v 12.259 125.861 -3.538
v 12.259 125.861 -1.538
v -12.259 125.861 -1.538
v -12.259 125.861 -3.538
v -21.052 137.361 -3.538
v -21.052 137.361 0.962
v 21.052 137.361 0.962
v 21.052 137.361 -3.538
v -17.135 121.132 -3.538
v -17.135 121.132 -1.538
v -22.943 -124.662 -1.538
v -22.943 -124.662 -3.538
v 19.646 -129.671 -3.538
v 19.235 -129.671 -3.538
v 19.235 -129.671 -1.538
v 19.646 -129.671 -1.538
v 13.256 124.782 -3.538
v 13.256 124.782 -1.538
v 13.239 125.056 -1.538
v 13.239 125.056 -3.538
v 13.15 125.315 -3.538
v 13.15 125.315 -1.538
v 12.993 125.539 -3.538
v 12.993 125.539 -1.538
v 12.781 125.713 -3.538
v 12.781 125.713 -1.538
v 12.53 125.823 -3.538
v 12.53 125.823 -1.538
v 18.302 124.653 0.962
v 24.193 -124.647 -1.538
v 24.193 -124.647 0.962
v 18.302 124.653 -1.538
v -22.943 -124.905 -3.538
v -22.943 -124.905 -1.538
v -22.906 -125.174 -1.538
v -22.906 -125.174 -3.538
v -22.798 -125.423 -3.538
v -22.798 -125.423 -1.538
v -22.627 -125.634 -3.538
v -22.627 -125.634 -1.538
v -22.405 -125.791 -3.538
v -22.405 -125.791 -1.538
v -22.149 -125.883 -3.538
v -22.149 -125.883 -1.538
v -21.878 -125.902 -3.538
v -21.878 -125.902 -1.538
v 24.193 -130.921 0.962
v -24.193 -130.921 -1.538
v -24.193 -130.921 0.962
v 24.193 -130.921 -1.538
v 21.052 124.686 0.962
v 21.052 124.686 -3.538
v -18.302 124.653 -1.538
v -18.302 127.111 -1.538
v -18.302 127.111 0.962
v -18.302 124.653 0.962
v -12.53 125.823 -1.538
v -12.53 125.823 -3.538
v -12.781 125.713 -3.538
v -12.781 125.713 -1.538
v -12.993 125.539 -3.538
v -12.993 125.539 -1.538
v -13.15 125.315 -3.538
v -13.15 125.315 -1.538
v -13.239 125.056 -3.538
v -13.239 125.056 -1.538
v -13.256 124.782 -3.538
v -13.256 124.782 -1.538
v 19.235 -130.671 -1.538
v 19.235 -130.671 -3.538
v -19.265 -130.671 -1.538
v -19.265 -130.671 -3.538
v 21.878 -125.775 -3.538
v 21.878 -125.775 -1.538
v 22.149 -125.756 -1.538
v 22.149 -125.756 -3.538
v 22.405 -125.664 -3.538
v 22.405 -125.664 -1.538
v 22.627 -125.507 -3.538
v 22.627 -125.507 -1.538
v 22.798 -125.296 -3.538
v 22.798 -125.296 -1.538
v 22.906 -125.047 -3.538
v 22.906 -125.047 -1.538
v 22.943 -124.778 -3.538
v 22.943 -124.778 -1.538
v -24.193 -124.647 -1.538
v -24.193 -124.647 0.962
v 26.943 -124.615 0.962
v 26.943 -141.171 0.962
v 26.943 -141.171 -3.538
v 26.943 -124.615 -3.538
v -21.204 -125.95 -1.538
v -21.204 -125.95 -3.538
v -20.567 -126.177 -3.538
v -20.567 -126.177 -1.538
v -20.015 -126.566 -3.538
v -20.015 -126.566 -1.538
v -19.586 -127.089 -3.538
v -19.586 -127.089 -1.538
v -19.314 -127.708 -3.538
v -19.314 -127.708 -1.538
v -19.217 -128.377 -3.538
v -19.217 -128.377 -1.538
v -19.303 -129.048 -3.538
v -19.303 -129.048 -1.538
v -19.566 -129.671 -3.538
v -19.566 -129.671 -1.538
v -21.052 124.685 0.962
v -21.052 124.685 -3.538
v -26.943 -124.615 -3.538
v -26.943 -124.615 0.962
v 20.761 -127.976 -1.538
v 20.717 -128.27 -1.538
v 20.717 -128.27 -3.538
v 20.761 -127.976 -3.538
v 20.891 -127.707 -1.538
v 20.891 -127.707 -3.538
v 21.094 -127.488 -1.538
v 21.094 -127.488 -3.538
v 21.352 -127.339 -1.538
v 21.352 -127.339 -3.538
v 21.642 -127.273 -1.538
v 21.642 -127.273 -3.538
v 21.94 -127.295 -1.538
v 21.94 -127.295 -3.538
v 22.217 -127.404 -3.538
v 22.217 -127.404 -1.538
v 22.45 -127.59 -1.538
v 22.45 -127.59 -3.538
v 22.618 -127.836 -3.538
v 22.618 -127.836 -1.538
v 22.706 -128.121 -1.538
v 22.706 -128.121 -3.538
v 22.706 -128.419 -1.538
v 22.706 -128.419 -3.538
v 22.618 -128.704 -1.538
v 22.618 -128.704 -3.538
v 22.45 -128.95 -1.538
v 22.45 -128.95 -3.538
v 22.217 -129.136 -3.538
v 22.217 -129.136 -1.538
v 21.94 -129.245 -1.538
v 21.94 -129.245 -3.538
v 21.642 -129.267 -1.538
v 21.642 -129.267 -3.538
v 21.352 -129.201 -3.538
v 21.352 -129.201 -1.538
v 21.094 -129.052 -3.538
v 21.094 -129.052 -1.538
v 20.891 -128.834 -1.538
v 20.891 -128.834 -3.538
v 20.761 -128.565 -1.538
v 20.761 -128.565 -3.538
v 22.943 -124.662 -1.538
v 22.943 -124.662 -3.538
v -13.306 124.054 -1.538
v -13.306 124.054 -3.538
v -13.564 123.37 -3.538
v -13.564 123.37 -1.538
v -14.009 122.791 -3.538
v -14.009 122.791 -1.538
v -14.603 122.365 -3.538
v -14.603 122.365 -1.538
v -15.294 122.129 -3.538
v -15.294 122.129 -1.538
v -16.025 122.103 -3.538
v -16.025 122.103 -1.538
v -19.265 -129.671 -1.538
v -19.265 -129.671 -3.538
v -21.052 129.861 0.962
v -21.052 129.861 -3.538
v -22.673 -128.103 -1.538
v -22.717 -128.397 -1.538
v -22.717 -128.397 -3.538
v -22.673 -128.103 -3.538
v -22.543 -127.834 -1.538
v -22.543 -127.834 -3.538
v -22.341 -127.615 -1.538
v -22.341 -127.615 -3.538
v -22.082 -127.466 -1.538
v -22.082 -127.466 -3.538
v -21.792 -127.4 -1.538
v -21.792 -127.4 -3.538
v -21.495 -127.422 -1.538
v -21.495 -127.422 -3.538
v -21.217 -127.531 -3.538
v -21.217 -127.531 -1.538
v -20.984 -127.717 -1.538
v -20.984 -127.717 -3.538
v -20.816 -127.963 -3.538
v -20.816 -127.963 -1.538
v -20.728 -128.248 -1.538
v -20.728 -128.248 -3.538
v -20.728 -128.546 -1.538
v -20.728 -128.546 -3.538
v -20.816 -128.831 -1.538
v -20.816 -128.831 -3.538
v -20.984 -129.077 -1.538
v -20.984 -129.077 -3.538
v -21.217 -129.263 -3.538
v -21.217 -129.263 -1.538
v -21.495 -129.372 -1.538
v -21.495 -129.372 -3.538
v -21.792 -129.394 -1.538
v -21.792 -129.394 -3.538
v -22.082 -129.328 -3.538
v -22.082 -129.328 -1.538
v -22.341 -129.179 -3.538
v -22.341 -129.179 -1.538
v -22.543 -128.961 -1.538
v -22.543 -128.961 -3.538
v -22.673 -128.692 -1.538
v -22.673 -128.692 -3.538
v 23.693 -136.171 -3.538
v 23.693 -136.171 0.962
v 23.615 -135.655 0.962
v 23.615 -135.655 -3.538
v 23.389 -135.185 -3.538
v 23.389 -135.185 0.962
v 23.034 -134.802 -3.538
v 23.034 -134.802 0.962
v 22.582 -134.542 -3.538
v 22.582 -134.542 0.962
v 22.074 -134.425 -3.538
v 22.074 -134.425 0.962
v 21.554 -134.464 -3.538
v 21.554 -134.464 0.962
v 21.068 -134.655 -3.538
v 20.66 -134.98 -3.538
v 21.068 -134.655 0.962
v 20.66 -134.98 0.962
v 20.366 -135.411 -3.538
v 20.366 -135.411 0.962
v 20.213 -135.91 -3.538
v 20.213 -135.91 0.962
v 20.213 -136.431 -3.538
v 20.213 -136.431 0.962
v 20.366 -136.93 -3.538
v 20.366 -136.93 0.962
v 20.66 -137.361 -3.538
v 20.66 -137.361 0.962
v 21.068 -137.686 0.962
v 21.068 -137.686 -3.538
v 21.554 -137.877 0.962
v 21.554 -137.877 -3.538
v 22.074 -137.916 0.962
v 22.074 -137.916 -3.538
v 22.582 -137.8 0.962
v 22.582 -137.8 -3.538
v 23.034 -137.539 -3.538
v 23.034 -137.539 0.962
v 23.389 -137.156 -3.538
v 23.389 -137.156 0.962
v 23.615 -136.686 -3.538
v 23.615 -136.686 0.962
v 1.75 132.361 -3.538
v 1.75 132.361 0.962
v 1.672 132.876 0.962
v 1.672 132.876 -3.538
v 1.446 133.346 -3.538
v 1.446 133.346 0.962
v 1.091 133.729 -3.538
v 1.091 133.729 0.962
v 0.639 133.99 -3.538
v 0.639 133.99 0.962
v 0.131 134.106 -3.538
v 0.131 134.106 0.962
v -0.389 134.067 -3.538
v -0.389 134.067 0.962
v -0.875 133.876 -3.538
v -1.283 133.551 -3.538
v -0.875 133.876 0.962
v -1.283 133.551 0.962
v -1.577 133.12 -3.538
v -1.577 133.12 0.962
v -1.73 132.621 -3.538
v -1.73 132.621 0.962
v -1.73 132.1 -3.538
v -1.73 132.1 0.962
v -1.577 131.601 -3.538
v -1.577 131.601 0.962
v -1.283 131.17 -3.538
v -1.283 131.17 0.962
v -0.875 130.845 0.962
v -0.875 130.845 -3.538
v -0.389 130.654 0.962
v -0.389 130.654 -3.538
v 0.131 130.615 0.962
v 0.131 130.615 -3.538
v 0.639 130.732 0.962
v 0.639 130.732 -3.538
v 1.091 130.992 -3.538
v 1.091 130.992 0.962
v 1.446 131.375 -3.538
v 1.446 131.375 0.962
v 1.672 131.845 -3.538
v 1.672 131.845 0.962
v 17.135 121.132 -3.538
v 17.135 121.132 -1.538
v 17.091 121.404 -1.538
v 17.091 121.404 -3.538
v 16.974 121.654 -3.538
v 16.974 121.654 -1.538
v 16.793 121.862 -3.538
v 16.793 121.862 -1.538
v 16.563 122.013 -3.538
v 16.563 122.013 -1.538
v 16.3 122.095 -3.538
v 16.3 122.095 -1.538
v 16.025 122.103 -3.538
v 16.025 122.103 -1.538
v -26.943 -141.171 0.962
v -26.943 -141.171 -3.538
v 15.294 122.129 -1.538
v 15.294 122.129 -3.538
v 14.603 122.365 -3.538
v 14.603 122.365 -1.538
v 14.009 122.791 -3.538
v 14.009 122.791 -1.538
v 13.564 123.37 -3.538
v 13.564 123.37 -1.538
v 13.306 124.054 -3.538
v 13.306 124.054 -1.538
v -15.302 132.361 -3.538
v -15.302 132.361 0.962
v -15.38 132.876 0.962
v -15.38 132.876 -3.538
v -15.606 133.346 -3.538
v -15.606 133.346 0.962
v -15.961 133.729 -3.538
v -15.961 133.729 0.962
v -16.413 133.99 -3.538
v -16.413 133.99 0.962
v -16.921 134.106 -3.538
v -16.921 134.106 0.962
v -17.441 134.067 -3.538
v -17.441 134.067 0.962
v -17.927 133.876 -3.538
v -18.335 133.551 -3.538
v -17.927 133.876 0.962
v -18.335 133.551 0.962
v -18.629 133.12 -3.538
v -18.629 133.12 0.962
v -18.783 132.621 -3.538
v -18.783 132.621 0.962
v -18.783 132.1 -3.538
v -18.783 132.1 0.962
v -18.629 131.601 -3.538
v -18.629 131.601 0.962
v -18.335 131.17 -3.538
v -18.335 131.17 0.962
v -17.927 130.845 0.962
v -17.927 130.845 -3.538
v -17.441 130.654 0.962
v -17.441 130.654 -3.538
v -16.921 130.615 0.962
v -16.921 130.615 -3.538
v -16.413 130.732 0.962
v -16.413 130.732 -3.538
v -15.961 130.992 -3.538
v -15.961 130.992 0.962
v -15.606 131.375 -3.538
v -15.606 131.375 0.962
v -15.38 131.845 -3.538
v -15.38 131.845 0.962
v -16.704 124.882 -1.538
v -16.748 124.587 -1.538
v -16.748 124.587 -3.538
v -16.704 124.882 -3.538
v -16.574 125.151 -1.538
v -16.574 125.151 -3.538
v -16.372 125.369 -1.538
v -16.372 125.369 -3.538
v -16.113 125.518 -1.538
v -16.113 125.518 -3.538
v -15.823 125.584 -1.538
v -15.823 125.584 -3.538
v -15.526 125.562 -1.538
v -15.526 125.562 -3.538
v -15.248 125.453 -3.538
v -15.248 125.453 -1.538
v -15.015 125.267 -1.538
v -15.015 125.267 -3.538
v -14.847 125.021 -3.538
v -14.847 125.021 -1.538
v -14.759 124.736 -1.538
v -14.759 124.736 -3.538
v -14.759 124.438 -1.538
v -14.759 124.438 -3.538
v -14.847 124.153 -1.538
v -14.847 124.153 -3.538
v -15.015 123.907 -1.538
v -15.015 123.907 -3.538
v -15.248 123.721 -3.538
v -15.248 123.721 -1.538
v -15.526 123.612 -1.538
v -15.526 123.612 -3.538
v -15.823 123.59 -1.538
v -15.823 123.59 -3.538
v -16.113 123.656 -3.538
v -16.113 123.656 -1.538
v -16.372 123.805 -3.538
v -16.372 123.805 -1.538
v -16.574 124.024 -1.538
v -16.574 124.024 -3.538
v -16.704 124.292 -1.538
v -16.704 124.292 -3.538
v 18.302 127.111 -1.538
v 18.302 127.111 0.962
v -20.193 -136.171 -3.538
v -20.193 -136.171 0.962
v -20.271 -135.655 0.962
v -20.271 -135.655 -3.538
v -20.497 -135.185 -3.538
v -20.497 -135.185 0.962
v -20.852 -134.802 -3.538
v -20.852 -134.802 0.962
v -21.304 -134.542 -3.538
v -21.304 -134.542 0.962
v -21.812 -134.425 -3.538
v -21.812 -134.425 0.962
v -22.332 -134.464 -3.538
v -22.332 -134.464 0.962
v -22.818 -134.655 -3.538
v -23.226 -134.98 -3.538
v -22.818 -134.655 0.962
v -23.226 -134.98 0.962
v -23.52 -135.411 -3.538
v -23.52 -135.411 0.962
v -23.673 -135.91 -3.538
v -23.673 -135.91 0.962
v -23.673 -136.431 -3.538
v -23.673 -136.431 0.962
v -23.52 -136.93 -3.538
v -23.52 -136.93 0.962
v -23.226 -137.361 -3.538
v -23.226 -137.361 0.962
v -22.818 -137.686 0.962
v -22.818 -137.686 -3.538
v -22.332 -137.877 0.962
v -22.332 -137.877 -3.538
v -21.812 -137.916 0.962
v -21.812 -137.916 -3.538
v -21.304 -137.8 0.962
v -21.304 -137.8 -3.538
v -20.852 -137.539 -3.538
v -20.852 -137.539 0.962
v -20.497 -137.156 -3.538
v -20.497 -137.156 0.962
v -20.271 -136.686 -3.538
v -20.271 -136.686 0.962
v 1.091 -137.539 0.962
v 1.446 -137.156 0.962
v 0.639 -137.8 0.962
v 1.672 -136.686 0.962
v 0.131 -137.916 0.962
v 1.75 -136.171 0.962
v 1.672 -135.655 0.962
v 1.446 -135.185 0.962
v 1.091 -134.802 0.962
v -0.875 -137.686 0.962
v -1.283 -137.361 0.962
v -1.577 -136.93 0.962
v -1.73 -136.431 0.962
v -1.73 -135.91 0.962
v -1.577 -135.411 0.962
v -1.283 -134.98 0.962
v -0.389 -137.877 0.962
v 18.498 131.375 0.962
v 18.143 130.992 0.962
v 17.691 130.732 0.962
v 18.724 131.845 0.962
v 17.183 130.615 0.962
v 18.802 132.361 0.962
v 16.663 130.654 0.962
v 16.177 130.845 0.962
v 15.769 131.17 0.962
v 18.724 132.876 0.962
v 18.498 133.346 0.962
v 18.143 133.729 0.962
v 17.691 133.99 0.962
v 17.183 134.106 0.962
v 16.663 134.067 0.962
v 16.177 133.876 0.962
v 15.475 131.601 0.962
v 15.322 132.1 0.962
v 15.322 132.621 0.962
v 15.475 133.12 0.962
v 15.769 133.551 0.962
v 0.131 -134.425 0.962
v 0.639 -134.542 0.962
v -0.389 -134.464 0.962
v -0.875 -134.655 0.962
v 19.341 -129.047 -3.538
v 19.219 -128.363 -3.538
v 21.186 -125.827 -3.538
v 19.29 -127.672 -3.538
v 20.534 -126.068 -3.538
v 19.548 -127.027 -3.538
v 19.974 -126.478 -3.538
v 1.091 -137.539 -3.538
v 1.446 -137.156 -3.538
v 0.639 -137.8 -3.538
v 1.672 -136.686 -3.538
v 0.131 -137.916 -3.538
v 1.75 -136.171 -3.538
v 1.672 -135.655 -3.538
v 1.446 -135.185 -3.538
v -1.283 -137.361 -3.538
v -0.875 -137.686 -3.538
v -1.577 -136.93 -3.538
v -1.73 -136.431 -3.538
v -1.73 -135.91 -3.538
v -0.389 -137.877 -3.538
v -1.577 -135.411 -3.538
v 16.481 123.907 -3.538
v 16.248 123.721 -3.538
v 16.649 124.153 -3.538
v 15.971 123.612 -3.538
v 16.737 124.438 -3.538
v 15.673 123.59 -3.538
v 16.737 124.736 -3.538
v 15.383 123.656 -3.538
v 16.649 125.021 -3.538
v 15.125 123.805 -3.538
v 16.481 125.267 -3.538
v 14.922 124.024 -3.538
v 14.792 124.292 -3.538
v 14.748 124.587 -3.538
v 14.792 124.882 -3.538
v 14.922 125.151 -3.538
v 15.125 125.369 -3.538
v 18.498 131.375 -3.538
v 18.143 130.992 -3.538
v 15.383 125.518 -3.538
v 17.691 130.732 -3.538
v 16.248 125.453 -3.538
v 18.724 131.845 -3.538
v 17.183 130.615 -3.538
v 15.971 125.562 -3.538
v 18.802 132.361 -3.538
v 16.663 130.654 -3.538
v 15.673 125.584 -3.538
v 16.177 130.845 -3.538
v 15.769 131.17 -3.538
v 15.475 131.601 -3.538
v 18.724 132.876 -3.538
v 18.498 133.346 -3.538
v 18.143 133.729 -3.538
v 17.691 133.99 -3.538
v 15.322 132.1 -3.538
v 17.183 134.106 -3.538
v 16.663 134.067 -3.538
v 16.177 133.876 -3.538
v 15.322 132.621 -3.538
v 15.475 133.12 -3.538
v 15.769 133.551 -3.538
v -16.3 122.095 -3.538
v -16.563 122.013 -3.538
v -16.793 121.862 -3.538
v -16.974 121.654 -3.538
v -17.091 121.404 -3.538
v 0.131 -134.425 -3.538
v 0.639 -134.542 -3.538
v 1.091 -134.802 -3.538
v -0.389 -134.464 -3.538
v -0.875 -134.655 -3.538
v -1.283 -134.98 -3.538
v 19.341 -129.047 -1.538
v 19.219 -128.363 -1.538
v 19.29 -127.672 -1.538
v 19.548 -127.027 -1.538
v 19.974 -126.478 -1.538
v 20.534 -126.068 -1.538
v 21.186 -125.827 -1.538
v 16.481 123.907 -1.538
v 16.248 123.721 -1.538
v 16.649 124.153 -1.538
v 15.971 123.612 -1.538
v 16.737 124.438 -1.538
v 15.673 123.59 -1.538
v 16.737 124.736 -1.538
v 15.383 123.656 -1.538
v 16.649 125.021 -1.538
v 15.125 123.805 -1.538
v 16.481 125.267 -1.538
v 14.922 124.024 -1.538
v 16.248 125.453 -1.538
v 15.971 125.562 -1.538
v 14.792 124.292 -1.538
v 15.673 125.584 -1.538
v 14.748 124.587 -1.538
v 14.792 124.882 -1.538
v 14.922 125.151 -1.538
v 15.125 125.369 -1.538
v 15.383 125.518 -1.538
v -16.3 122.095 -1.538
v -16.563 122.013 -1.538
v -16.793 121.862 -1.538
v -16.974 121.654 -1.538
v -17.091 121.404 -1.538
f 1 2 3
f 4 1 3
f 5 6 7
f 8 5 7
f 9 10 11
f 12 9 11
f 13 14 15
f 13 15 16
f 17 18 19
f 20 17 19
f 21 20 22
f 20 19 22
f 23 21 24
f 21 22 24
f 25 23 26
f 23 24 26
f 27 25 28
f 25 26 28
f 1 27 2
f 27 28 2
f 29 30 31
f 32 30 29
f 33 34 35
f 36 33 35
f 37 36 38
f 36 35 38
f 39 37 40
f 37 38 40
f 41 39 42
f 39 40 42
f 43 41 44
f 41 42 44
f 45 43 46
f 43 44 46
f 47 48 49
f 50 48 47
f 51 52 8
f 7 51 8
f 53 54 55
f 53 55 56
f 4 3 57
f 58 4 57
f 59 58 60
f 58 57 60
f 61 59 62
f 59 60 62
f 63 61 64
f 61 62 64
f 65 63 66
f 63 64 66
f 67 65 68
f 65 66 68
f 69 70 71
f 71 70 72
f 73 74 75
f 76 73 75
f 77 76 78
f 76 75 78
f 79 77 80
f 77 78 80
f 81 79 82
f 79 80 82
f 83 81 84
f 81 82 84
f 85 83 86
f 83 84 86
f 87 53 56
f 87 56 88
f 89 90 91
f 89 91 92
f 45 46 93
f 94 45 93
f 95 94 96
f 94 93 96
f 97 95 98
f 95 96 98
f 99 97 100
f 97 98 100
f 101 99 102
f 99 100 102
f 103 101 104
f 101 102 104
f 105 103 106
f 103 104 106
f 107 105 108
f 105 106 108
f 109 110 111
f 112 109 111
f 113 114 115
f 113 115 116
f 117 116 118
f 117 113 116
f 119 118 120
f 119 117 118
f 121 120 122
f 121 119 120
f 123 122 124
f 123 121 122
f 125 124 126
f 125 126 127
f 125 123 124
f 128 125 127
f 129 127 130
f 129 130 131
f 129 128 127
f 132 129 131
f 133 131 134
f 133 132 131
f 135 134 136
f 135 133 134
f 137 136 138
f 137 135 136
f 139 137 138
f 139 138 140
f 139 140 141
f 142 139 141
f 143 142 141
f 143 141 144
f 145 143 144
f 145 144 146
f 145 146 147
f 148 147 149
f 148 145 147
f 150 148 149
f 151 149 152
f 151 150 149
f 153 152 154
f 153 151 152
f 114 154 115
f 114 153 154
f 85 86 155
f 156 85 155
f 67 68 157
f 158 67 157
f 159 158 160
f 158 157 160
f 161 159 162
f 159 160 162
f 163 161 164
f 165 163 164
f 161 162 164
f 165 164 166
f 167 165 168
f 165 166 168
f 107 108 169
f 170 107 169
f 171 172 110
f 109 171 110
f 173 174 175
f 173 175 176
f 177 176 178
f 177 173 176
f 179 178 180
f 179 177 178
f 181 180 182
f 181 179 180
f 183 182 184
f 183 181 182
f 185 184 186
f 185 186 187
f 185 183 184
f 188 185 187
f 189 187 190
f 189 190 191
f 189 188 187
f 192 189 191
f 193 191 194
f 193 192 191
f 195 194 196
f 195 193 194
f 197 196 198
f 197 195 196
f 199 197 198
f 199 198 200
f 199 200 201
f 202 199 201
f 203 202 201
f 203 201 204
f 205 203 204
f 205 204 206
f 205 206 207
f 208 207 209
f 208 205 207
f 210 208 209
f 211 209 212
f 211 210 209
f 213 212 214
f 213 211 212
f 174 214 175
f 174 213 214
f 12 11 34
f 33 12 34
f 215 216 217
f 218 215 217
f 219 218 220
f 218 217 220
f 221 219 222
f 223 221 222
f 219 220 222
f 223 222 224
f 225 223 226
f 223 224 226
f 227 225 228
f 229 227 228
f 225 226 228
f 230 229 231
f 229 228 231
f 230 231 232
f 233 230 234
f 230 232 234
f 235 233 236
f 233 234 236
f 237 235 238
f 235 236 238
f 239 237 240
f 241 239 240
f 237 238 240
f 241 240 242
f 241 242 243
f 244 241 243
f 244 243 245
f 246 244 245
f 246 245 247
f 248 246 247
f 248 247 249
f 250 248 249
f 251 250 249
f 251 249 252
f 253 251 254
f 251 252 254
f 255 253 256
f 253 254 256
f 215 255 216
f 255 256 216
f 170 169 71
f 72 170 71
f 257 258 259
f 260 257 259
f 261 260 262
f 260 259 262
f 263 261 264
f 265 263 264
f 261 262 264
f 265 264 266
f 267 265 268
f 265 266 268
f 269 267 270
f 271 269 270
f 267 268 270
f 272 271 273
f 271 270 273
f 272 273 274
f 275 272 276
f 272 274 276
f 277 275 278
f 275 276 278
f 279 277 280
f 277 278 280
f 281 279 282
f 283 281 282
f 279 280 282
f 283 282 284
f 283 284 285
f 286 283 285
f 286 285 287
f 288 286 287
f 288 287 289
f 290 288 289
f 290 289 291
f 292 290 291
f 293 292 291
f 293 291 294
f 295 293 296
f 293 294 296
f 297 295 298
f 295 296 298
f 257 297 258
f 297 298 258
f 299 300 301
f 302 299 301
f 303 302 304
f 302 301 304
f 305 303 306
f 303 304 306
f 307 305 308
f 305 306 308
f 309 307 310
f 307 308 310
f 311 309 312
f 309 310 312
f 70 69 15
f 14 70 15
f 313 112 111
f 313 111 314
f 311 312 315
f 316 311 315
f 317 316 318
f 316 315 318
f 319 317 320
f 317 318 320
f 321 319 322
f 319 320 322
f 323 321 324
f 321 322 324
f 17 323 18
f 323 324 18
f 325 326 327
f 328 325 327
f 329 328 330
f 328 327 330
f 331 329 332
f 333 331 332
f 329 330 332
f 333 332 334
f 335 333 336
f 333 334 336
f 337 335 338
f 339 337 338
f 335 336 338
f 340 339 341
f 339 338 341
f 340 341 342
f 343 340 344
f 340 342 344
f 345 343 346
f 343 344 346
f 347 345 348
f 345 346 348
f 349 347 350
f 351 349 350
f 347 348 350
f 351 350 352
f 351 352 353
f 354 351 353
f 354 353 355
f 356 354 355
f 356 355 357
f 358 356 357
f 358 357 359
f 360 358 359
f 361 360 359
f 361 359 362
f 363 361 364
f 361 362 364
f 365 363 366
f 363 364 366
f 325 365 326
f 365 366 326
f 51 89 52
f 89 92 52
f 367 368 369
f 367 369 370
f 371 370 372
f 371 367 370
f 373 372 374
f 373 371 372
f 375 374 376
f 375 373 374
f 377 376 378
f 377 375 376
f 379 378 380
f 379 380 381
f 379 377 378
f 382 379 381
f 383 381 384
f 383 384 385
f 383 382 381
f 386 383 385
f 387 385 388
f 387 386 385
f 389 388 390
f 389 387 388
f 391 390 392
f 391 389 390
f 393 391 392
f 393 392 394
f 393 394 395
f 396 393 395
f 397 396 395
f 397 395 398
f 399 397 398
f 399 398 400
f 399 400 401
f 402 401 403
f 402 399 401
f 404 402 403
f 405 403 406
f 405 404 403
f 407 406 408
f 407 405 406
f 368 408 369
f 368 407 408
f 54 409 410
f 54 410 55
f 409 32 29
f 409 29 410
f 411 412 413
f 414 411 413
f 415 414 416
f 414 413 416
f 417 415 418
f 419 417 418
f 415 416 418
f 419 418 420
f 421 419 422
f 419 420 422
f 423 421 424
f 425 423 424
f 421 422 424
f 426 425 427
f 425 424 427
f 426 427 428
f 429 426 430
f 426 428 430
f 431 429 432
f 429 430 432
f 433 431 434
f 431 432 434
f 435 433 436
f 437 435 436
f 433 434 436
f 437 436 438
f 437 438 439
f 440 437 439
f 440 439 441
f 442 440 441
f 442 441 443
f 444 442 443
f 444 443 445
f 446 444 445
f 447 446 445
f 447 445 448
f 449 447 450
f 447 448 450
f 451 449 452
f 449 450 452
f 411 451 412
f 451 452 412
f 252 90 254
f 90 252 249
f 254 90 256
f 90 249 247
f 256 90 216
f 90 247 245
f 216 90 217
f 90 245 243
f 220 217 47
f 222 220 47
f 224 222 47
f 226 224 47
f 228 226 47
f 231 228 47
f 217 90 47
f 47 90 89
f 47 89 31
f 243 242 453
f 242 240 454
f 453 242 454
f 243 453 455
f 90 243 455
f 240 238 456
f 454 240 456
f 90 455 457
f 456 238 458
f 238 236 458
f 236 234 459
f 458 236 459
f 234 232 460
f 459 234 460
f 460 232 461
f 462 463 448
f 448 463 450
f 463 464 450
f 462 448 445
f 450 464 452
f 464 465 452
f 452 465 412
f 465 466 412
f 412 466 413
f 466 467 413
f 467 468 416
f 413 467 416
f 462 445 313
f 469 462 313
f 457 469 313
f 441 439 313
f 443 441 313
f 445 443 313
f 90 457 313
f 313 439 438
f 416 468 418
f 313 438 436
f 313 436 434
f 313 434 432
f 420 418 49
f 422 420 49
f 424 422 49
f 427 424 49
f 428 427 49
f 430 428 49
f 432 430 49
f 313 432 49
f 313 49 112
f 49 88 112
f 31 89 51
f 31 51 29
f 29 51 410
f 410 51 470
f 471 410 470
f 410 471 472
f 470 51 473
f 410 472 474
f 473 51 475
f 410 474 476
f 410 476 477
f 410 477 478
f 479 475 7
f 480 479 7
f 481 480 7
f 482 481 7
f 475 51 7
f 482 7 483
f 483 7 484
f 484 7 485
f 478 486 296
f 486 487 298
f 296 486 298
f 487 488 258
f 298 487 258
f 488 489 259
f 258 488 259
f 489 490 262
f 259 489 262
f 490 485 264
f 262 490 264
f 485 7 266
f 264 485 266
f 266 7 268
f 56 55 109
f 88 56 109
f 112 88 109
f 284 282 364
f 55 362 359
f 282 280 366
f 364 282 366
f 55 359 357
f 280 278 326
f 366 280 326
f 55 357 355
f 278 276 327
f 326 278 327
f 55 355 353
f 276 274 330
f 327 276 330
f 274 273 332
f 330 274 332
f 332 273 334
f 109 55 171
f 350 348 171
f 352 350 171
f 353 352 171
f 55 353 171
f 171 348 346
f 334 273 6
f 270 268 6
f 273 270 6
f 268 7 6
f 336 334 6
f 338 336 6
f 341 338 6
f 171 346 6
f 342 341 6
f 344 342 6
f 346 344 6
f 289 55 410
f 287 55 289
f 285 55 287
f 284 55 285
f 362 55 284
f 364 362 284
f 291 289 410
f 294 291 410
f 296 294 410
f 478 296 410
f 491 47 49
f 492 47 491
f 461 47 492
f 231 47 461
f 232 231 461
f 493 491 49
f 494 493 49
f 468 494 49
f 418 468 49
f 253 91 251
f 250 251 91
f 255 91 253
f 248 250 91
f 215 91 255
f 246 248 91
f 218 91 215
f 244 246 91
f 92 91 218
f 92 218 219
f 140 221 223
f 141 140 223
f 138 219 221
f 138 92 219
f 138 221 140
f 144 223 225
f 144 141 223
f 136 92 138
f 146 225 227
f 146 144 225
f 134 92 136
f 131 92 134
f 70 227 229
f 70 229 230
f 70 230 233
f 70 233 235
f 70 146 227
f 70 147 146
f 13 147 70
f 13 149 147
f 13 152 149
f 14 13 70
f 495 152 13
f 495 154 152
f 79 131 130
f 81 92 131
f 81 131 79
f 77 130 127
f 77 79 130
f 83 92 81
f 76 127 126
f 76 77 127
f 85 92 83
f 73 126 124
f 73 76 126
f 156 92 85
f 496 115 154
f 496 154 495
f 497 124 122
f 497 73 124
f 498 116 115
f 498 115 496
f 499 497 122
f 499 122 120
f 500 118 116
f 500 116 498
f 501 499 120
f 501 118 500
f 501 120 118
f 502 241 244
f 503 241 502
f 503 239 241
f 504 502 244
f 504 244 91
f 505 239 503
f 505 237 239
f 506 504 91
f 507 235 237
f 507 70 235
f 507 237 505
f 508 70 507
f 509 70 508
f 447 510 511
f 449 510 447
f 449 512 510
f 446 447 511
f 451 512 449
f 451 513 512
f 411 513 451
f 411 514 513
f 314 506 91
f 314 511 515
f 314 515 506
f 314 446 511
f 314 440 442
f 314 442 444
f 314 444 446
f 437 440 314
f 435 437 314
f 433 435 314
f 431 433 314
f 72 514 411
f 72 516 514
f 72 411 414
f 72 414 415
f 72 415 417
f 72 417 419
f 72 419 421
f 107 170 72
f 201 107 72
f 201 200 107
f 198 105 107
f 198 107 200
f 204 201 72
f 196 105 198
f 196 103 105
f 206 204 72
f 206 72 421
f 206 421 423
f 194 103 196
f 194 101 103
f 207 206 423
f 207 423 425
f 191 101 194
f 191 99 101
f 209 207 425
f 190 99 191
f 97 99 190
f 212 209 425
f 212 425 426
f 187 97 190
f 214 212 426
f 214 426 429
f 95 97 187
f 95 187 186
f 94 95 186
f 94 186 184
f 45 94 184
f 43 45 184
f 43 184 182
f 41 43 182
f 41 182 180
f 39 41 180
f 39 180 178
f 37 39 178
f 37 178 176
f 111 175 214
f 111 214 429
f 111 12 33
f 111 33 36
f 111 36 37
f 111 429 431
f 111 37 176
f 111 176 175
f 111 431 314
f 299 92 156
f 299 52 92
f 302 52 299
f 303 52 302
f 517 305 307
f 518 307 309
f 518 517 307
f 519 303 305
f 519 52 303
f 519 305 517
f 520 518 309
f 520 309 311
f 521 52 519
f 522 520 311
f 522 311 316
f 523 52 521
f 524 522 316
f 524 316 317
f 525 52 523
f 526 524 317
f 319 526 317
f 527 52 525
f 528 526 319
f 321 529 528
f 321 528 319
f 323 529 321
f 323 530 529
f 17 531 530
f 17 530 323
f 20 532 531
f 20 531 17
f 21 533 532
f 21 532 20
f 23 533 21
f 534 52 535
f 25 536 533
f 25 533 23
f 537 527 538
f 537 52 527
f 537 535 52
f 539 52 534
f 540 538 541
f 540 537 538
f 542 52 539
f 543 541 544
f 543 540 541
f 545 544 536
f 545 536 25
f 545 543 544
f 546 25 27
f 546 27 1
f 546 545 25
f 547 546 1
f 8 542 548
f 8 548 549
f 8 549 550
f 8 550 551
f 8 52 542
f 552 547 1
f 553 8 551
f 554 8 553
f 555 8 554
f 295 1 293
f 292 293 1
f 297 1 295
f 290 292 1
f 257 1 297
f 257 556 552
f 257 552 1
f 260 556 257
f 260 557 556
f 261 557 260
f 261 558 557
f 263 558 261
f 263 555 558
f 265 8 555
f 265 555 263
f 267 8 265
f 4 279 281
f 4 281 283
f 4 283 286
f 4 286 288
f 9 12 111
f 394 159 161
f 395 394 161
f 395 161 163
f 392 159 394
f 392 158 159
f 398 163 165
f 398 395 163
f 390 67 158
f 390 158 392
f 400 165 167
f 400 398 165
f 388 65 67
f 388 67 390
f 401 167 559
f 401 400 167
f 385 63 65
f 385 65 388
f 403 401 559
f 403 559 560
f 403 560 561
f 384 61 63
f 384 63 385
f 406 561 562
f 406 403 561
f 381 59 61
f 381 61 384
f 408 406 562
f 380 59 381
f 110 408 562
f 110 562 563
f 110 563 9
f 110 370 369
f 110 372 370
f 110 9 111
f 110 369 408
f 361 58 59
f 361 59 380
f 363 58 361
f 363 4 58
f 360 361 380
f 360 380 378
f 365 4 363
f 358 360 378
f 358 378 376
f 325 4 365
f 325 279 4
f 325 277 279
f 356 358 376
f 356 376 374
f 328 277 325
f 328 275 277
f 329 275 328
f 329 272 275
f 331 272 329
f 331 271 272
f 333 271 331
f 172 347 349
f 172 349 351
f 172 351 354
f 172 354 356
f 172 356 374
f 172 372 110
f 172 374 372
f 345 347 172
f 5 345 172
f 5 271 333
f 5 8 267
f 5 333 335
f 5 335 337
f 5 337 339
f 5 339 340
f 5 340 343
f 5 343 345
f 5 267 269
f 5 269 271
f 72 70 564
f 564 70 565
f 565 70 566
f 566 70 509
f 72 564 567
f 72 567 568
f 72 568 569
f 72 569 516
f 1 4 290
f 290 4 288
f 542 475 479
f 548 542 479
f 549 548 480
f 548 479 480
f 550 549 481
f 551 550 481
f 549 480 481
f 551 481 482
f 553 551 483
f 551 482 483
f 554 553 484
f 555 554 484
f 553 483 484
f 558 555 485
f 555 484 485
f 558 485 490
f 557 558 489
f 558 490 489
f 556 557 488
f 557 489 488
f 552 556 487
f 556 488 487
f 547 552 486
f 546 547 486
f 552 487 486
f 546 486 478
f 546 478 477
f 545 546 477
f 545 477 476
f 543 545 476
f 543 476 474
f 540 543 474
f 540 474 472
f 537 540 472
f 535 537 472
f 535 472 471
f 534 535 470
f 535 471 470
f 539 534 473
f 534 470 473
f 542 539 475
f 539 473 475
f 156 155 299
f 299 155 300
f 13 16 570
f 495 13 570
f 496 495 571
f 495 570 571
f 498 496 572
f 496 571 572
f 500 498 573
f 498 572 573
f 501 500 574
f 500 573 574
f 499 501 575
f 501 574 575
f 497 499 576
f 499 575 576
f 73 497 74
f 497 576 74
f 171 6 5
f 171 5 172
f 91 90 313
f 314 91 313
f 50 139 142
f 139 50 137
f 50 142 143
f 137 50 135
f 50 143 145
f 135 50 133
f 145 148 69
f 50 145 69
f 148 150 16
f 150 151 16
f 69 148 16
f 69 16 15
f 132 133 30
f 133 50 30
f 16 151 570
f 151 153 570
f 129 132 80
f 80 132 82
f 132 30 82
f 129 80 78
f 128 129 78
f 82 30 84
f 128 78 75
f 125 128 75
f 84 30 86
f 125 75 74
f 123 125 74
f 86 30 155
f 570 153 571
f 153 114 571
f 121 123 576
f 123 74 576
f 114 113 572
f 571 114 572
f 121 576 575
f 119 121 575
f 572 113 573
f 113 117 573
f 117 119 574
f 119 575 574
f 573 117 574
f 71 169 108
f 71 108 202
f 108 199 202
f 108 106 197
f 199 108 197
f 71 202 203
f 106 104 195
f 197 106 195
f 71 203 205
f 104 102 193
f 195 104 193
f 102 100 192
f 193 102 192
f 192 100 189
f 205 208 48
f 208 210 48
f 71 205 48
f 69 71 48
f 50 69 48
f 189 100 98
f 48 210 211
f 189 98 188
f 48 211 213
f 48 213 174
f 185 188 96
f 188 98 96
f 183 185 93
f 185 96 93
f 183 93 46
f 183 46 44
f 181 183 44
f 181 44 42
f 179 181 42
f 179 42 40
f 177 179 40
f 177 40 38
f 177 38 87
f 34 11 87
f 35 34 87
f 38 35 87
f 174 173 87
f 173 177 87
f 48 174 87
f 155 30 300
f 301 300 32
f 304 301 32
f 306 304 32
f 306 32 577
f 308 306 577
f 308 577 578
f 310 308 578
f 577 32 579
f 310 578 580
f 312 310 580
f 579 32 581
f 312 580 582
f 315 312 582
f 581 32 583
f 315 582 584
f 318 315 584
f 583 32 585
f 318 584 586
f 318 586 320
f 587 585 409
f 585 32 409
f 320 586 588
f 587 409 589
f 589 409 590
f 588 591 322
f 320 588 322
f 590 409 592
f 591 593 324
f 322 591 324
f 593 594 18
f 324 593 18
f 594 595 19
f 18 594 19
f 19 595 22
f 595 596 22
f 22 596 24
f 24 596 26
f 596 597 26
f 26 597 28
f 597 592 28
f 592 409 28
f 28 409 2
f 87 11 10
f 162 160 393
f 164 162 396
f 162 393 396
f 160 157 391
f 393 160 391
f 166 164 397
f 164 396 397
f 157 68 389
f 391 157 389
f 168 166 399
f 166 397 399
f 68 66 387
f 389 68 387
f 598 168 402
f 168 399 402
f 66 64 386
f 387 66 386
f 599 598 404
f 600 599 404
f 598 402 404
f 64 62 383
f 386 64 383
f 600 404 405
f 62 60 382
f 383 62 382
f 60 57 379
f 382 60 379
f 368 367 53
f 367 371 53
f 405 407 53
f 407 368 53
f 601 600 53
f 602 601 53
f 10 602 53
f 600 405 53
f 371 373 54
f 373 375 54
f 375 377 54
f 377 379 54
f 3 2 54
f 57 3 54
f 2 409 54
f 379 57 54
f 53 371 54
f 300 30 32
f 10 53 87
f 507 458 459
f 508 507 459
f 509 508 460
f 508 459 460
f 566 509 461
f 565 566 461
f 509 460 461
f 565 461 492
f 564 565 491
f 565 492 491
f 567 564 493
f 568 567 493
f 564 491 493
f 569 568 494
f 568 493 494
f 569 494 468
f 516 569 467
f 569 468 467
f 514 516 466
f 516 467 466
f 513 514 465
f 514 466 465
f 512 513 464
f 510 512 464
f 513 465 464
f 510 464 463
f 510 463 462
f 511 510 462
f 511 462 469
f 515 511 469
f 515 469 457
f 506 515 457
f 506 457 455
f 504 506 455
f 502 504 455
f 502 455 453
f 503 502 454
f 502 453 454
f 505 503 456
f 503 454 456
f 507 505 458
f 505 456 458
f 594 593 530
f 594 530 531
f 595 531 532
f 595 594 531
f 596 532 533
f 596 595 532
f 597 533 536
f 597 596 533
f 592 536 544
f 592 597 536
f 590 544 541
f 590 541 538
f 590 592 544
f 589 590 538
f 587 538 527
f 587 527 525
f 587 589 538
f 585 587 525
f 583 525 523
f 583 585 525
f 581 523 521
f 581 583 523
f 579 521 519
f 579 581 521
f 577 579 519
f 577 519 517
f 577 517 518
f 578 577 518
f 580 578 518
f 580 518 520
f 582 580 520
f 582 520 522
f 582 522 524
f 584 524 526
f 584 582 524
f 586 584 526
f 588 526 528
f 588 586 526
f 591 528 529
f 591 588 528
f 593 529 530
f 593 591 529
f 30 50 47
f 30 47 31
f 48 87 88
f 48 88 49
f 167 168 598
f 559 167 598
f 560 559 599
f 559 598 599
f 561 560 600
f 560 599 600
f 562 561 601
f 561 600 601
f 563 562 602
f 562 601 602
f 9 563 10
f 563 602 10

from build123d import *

# Parameters (mm, degrees)
SKETCH_2_R      = 1
EXTRUDE_1_DEPTH = 2
EXTRUDE_2_DEPTH = 2
EXTRUDE_3_DEPTH = 2.5
SKETCH_5_R      = 1.75
EXTRUDE_4_DEPTH = 4.5


with BuildPart() as part:
    # 草图2 → 凸台-拉伸1 (new body)
    with BuildSketch(Plane(origin=(0, 0, -1.538354077), x_dir=(-1, 0, 0), z_dir=(0, 0, -1))):
        with BuildLine():
            Line((-22.942959106, -124.662212149), (-17.134907671, 121.132350923))
            ThreePointArc((-17.134907671, 121.132350923), (-16.793190136, 121.861742775), (-16.024570953, 122.102591063))
            ThreePointArc((-16.024570953, 122.102591063), (-14.009380987, 122.790837638), (-13.255665128, 124.782466708))
            ThreePointArc((-13.255665128, 124.782466708), (-12.992914403, 125.539491489), (-12.25871858, 125.860553721))
            Line((-12.25871858, 125.860553721), (12.25871858, 125.860553721))
            ThreePointArc((12.25871858, 125.860553721), (12.992914403, 125.539491489), (13.255665128, 124.782466708))
            ThreePointArc((13.255665128, 124.782466708), (14.009380087, 122.79083851), (16.024568463, 122.102590786))
            ThreePointArc((16.024568463, 122.102590786), (16.793187022, 121.861742062), (17.134904184, 121.13235055))
            Line((17.134904184, 121.13235055), (22.942959106, -124.662212156))
            Line((22.942959106, -124.662212156), (22.942959106, -124.904555532))
            ThreePointArc((22.942959106, -124.904555532), (22.626864313, -125.634126411), (21.878411771, -125.902470178))
            ThreePointArc((21.878411771, -125.902470178), (19.586380534, -127.089481736), (19.565603095, -129.670561341))
            Line((19.565603095, -129.670561341), (19.265011022, -129.670561341))
            Line((19.265011022, -129.670561341), (19.265011022, -130.670561341))
            Line((19.265011022, -130.670561341), (23.942959106, -130.670561341))
            Line((23.942959106, -130.670561341), (23.942959106, -124.650398948))
            Line((23.942959106, -124.650398948), (18.052063488, 124.649948906))
            Line((18.052063488, 124.649948906), (18.052059944, 126.860553721))
            Line((18.052059944, 126.860553721), (-18.052059944, 126.860553721))
            Line((-18.052059944, 126.860553721), (-18.052059944, 124.65024892))
            Line((-18.052059944, 124.65024892), (-23.942959106, -124.650398948))
            Line((-23.942959106, -124.650398948), (-23.942959106, -130.670561341))
            Line((-23.942959106, -130.670561341), (-19.234988978, -130.670561341))
            Line((-19.234988978, -130.670561341), (-19.234988978, -129.670561341))
            Line((-19.234988978, -129.670561341), (-19.646017972, -129.670561341))
            ThreePointArc((-19.646017972, -129.670561341), (-19.548027097, -127.027128176), (-21.878411771, -125.775469924))
            ThreePointArc((-21.878411771, -125.775469924), (-22.626864313, -125.507126157), (-22.942959106, -124.777555278))
            Line((-22.942959106, -124.777555278), (-22.942959106, -124.662212149))
        make_face()
        with Locations((-21.717043434, -128.270256541)):
            Circle(SKETCH_2_R, mode=Mode.SUBTRACT)
        with Locations((21.717043434, -128.397256794)):
            Circle(SKETCH_2_R, mode=Mode.SUBTRACT)
        with Locations((-15.748031496, 124.587249174)):
            Circle(SKETCH_2_R, mode=Mode.SUBTRACT)
        with Locations((15.748031496, 124.587249174)):
            Circle(SKETCH_2_R, mode=Mode.SUBTRACT)
    extrude(amount=EXTRUDE_1_DEPTH)

    # 草图3 → 凸台-拉伸2 (add)
    with BuildSketch(Plane(origin=(0, 0, -3.538354077), x_dir=(-1, 0, 0), z_dir=(0, 0, -1))):
        Polygon((26.942959106, -124.614959326), (21.052063431, 124.685390934), (21.052055134, 129.860553721), (-21.052059944, 129.860553721), (-21.052059944, 124.685688522), (-26.942959106, -124.614959347), (-26.942959106, -133.670561341), (26.942959106, -133.670561341), align=None)
        Polygon((18.052059944, 126.860553721), (-18.052059944, 126.860553721), (-18.052059944, 124.65024892), (-23.942959106, -124.650398948), (-23.942959106, -130.670561341), (23.942959106, -130.670561341), (23.942959106, -124.650398948), (18.052063488, 124.649948906), align=None, mode=Mode.SUBTRACT)
    extrude(amount=-EXTRUDE_2_DEPTH)

    # 草图4 → 凸台-拉伸3 (add)
    with BuildSketch(Plane.XY.offset(-1.538354077)):
        Polygon((-21.052063431, 124.685390934), (-26.942959106, -124.614959326), (-26.942959106, -133.670561341), (26.942959106, -133.670561341), (26.942959106, -124.614959347), (21.052059944, 124.685688522), (21.052059944, 129.860553721), (-21.052055134, 129.860553721), align=None)
        Polygon((-18.302059543, 127.110553721), (-18.302063484, 124.652902409), (-24.192959106, -124.647445647), (-24.192959106, -130.920561341), (24.192959106, -130.920561341), (24.192959106, -124.647445648), (18.302059944, 124.653202221), (18.302059944, 127.110553721), align=None, mode=Mode.SUBTRACT)
    extrude(amount=EXTRUDE_3_DEPTH)

    # 草图5 → 凸台-拉伸4 (add)
    # profile 1 of 2: a face of its own
    with BuildSketch(Plane.XY.offset(0.961645923)):
        Polygon((-26.942959106, -133.670561341), (26.942959106, -133.670561341), (26.942959106, -138.670561341), (26.942959106, -141.170561341), (-26.942959106, -141.170561341), (-26.942959106, -138.670561341), align=None)
        with Locations((2.405e-06, -136.170561341)):
            Circle(SKETCH_5_R, mode=Mode.SUBTRACT)
        with Locations((21.942959106, -136.170561341)):
            Circle(SKETCH_5_R, mode=Mode.SUBTRACT)
        with Locations((-21.942959106, -136.170561341)):
            Circle(SKETCH_5_R, mode=Mode.SUBTRACT)
    # profile 2 of 2: a face of its own
    with BuildSketch(Plane.XY.offset(0.961645923)):
        Polygon((21.052059944, 129.860553721), (-21.052055134, 129.860553721), (-21.052055134, 134.860553721), (-21.052055134, 137.360553721), (21.052059944, 137.360553721), (21.052059944, 134.860553721), align=None)
        with Locations((-17.052055134, 132.360553721)):
            Circle(SKETCH_5_R, mode=Mode.SUBTRACT)
        with Locations((17.052059944, 132.360553721)):
            Circle(SKETCH_5_R, mode=Mode.SUBTRACT)
        with Locations((2.405e-06, 132.360553721)):
            Circle(SKETCH_5_R, mode=Mode.SUBTRACT)
    extrude(amount=-EXTRUDE_4_DEPTH)


solid = part.part
